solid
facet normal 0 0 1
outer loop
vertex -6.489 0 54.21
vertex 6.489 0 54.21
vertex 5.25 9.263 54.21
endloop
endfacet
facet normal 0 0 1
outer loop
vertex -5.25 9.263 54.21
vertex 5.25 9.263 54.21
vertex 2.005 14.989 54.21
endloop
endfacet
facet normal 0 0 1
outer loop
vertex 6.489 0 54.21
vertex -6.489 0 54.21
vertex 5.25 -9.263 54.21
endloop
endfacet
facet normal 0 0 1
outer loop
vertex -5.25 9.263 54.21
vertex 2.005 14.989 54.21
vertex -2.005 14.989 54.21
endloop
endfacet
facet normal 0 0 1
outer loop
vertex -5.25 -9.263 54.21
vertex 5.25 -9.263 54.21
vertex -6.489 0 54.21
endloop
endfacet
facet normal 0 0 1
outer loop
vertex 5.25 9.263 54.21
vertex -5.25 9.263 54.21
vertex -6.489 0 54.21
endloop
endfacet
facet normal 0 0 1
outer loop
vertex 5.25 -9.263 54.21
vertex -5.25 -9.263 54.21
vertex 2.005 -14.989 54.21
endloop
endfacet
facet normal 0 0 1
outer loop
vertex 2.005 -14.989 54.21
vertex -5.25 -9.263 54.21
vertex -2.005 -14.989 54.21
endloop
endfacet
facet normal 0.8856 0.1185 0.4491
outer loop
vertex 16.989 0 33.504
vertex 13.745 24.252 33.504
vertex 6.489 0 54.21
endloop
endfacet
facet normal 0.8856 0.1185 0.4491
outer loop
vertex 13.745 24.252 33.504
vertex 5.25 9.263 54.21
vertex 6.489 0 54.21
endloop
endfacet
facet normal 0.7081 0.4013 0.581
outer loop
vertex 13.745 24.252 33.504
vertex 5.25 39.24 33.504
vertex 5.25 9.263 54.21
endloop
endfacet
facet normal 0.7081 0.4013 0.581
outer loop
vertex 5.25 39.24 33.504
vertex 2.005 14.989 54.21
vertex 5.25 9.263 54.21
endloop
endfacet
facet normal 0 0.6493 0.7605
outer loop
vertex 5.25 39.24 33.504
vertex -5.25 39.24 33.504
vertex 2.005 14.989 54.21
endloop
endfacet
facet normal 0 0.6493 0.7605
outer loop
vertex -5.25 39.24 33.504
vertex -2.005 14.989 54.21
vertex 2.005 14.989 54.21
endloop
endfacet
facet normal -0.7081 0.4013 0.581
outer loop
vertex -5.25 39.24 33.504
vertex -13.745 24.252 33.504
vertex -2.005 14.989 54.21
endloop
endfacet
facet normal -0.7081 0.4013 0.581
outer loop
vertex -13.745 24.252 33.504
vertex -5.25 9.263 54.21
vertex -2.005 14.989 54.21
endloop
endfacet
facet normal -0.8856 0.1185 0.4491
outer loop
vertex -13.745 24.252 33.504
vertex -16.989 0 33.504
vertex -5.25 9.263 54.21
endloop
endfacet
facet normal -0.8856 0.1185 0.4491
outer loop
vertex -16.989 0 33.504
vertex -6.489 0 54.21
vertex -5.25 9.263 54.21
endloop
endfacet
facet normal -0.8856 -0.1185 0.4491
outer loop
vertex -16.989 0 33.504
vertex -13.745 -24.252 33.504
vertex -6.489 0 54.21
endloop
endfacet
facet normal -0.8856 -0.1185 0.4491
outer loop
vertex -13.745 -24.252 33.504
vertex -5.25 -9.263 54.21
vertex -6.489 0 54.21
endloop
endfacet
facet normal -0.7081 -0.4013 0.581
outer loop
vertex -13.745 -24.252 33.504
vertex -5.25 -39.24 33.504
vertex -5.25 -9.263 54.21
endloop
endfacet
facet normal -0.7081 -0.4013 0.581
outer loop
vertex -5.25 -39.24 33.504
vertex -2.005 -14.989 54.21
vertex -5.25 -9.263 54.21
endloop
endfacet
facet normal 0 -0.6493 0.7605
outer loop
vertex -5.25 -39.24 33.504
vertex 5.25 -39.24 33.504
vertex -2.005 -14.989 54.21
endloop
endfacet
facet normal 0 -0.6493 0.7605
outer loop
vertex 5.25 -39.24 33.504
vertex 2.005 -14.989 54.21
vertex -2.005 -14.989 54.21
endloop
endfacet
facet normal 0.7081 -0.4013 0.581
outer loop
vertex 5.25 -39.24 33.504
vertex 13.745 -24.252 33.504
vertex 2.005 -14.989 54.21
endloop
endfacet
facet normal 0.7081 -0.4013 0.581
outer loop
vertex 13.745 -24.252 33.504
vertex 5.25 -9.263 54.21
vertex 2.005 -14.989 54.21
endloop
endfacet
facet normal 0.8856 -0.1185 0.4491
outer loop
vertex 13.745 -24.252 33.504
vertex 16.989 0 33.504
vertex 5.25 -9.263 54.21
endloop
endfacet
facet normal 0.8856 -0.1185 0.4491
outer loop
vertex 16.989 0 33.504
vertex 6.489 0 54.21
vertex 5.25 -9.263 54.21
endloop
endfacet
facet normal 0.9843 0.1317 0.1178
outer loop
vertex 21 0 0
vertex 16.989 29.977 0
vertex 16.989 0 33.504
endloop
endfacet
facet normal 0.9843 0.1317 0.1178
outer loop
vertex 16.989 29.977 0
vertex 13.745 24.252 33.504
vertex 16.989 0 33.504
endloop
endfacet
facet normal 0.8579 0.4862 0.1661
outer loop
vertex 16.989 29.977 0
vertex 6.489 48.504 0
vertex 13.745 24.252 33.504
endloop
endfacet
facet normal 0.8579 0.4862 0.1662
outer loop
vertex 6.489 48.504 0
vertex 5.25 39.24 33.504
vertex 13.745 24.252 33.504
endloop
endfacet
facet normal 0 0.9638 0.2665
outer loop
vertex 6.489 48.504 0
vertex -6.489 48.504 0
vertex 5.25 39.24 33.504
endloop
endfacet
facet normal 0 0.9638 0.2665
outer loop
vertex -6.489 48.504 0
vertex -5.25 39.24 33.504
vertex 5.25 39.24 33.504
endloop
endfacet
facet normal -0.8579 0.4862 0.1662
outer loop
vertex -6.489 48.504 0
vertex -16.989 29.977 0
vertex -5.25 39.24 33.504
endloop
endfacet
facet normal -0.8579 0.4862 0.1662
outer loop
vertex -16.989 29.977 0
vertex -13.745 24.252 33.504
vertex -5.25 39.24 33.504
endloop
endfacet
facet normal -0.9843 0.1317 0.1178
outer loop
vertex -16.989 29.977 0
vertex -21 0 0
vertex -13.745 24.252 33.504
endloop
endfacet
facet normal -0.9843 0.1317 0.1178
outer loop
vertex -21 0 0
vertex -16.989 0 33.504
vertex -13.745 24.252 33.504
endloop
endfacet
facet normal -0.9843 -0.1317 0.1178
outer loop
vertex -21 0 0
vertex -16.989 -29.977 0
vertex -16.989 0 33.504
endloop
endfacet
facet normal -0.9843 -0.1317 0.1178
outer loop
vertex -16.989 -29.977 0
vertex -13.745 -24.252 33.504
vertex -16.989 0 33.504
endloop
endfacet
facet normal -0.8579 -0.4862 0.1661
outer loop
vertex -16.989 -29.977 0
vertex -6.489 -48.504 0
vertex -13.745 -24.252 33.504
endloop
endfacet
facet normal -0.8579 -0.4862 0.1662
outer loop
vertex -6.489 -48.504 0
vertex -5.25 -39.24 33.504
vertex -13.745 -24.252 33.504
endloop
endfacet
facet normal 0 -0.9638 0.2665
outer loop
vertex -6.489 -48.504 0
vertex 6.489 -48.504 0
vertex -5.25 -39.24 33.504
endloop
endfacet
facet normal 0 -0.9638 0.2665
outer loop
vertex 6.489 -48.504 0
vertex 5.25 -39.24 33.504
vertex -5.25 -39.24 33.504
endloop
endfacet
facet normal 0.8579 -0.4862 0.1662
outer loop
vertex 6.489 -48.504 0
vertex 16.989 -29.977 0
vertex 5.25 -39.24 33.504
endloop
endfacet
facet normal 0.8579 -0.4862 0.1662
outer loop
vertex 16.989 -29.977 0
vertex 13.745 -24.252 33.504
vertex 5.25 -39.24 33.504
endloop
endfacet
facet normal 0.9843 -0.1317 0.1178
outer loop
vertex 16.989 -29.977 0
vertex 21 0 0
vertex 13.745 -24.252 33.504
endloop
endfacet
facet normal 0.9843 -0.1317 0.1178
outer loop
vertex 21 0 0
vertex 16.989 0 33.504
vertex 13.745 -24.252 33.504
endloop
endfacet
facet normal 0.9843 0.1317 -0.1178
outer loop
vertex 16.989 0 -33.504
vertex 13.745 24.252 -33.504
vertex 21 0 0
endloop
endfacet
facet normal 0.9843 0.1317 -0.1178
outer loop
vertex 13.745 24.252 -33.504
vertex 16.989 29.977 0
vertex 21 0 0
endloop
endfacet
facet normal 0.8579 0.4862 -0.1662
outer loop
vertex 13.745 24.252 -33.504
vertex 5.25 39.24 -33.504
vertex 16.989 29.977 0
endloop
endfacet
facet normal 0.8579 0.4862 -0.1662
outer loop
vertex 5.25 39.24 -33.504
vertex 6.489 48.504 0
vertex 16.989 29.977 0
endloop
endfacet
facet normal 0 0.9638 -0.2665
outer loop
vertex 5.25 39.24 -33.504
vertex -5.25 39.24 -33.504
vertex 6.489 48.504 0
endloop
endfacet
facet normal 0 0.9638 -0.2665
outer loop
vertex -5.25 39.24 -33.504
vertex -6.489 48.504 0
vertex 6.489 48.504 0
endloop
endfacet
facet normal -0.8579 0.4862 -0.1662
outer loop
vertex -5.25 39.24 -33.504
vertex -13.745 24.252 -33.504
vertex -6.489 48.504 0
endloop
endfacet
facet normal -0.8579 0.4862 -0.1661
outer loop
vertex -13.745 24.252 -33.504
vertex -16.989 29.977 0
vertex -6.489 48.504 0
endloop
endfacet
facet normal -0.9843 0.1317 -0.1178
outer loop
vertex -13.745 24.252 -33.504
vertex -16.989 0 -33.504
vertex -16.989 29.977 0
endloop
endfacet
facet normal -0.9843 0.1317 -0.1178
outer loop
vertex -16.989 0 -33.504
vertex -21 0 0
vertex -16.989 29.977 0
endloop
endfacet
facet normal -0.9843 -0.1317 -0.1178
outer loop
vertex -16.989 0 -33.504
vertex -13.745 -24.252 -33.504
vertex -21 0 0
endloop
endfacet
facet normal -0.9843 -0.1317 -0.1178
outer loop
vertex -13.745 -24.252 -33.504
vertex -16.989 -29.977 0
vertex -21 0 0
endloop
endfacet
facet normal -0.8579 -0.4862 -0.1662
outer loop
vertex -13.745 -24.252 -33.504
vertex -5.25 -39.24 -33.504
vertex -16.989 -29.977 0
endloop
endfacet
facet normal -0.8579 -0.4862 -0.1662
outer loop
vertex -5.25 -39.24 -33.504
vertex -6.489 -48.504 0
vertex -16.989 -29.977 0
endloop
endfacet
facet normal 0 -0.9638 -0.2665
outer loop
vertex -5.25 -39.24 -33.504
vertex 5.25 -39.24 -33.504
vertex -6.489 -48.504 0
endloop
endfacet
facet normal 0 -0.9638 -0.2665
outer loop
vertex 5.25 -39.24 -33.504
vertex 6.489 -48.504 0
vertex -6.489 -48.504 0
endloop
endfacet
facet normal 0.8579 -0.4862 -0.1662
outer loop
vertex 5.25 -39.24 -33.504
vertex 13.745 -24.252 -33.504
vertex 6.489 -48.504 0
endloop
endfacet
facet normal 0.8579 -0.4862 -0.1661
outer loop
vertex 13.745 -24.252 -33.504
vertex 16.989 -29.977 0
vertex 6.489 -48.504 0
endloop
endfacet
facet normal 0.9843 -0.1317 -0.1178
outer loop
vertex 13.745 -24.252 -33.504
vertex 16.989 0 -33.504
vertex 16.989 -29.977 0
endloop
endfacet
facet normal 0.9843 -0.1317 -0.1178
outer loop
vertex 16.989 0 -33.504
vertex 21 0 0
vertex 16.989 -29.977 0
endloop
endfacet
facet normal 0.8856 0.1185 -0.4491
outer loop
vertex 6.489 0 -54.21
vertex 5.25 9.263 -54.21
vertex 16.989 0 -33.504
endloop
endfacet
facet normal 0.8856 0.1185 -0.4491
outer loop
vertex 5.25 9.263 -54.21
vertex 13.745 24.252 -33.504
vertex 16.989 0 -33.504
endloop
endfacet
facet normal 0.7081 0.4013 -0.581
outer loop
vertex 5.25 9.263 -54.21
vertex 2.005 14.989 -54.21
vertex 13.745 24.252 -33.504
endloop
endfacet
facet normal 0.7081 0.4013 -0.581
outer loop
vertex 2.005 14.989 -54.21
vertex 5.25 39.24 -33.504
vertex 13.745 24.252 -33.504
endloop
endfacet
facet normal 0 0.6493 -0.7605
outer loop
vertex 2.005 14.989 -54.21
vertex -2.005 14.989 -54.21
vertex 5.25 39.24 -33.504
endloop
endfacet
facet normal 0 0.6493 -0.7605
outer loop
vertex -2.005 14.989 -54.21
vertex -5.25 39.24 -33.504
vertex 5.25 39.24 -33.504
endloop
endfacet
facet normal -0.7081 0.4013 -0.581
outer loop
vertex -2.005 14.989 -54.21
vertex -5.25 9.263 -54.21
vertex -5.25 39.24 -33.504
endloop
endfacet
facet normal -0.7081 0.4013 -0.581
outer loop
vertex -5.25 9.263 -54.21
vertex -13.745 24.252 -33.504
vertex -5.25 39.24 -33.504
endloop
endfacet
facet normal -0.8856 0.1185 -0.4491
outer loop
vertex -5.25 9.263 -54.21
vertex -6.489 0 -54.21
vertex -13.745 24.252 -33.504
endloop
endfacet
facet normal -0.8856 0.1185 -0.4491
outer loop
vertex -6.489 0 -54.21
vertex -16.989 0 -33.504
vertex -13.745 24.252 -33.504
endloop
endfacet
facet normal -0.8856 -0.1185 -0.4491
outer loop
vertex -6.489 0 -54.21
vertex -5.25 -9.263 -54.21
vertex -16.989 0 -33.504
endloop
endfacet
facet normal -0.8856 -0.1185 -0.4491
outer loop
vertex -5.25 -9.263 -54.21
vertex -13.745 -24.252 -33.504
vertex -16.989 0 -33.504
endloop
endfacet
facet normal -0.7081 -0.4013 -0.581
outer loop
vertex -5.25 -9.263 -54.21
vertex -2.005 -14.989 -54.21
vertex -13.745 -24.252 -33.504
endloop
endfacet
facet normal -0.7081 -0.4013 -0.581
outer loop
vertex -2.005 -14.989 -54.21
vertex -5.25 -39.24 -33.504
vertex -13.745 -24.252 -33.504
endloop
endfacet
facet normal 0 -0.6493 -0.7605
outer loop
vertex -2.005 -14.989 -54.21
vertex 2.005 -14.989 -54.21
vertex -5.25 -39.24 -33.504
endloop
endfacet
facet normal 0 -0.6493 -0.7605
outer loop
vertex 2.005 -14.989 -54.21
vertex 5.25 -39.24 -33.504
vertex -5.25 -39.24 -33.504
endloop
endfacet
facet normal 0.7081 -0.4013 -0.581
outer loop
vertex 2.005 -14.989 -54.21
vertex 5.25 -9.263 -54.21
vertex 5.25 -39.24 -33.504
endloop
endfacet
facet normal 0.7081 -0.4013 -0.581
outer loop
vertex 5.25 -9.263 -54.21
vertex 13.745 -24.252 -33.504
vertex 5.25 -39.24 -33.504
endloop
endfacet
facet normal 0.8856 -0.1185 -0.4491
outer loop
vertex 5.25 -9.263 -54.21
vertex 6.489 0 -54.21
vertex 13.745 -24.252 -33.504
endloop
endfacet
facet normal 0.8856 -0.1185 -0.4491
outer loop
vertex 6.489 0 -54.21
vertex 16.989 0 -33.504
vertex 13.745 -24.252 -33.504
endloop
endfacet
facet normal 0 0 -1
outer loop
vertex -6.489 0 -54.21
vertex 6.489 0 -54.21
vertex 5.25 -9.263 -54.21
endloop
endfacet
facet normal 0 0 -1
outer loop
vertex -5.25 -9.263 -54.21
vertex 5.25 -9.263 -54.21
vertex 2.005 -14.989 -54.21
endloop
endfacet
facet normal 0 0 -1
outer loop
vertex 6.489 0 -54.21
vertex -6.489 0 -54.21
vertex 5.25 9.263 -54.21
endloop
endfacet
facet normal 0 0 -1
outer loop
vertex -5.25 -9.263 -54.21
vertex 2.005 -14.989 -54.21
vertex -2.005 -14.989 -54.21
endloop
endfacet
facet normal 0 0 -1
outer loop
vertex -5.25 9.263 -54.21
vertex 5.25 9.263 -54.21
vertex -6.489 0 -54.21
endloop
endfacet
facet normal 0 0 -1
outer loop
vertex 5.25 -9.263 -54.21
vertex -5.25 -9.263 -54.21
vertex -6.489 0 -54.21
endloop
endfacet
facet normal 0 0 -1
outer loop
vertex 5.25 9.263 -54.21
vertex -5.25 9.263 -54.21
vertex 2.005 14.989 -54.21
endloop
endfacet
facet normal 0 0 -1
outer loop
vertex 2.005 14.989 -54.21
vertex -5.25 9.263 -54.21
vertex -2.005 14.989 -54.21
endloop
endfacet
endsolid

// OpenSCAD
// Generated by SolidPython 1.0.1 on 2020-07-29 00:46:48


scale(v = [7, 17, 19]) {
	sphere(r = 3);
}
/***********************************************
*********      SolidPython code:      **********
************************************************
 
# import packages: SolidPython
from solid import *
from solid.utils import *
from itertools import chain, combinations, permutations


class Resize:

    def __init__(self, scad_file):
        self.scad_file = scad_file
        #self.scad_file = import_scad(scad_file)
        # cone/cylinder param:
        self.r1 = 0
        self.r2 = 0
        self.h = 0
        # rectangular prism param:
        self.w = 0
        self.l = 0
        # ellipse param:
        self.r = 0

    # import OpenScad code (file name corresponds to shape)


    # classify shape + parameters
    def assign(self, param1, param2, param3):
        if self.scad_file == 'cone.scad':
            self.r1 = param1
            self.r2 = param2
            self.h = param3
        elif self.scad_file == 'cylinder.scad':
            self.r1 = param1
            self.r2 = param2
            self.h = param3
        elif self.scad_file == 'rectangularPrism.scad':
            self.h = param1
            self.l = param2
            self.w = param3
        else:
            self.r = param1
            self.h = param2

    # resize parameters
    def iterate(self):
        x = range(3, 20, 2)
        i = 1
        if self.scad_file == 'cone.scad':
            tempList = list(permutations(x, 2))
            for temp in tempList:
                param1 = temp[0]
                param2 = temp[1]
                filepath = 'produced_scad_files/' + 'cone' + str(param1) + '_' + str(param2) + '_' + '.scad'
                scad_render_to_file(cylinder(h=param1, r1=param2, r2=0), filepath)

        elif self.scad_file == 'cylinder.scad':
            tempList = list(permutations(x, 3))
            for temp in tempList:
                param1 = temp[0]
                param2 = temp[1]
                filepath = 'produced_scad_files/' + 'cylinder' + str(param1) + '_' + str(param2) + '_' + '.scad'
                scad_render_to_file(cylinder(h=param1, r1=param2, r2=param2), filepath)

        elif self.scad_file == 'rectangularPrism.scad':
            tempList = list(permutations(x, 3))
            for temp in tempList:
                param1 = temp[0]
                param2 = temp[1]
                param3 = temp[2]
                filepath = 'produced_scad_files/' + 'rectangularPrism' + str(param1) + '_' + str(param2) + '_' + str(
                    param3) + '.scad'
                scad_render_to_file(cube(size=(param1, param2, param3)), filepath)

        elif self.scad_file == 'ellipse.scad':
            tempList = list(permutations(x, 4))
            for temp in tempList:
                param1 = temp[0]
                param2 = temp[1]
                param3 = temp[2]
                param4 = temp[3]
                filepath = 'produced_scad_files/' + 'ellipse' + str(param1) + '_' + str(param2) + '_' + str(param3) + '_' + str(param4) + '.scad'
                scad_render_to_file(scale([param1, param2, param3])(sphere(r=param4)), filepath)

    def render_to_scadfile(self):
        scad_render_to_file(scad, 'example.scad') 
 
************************************************/
